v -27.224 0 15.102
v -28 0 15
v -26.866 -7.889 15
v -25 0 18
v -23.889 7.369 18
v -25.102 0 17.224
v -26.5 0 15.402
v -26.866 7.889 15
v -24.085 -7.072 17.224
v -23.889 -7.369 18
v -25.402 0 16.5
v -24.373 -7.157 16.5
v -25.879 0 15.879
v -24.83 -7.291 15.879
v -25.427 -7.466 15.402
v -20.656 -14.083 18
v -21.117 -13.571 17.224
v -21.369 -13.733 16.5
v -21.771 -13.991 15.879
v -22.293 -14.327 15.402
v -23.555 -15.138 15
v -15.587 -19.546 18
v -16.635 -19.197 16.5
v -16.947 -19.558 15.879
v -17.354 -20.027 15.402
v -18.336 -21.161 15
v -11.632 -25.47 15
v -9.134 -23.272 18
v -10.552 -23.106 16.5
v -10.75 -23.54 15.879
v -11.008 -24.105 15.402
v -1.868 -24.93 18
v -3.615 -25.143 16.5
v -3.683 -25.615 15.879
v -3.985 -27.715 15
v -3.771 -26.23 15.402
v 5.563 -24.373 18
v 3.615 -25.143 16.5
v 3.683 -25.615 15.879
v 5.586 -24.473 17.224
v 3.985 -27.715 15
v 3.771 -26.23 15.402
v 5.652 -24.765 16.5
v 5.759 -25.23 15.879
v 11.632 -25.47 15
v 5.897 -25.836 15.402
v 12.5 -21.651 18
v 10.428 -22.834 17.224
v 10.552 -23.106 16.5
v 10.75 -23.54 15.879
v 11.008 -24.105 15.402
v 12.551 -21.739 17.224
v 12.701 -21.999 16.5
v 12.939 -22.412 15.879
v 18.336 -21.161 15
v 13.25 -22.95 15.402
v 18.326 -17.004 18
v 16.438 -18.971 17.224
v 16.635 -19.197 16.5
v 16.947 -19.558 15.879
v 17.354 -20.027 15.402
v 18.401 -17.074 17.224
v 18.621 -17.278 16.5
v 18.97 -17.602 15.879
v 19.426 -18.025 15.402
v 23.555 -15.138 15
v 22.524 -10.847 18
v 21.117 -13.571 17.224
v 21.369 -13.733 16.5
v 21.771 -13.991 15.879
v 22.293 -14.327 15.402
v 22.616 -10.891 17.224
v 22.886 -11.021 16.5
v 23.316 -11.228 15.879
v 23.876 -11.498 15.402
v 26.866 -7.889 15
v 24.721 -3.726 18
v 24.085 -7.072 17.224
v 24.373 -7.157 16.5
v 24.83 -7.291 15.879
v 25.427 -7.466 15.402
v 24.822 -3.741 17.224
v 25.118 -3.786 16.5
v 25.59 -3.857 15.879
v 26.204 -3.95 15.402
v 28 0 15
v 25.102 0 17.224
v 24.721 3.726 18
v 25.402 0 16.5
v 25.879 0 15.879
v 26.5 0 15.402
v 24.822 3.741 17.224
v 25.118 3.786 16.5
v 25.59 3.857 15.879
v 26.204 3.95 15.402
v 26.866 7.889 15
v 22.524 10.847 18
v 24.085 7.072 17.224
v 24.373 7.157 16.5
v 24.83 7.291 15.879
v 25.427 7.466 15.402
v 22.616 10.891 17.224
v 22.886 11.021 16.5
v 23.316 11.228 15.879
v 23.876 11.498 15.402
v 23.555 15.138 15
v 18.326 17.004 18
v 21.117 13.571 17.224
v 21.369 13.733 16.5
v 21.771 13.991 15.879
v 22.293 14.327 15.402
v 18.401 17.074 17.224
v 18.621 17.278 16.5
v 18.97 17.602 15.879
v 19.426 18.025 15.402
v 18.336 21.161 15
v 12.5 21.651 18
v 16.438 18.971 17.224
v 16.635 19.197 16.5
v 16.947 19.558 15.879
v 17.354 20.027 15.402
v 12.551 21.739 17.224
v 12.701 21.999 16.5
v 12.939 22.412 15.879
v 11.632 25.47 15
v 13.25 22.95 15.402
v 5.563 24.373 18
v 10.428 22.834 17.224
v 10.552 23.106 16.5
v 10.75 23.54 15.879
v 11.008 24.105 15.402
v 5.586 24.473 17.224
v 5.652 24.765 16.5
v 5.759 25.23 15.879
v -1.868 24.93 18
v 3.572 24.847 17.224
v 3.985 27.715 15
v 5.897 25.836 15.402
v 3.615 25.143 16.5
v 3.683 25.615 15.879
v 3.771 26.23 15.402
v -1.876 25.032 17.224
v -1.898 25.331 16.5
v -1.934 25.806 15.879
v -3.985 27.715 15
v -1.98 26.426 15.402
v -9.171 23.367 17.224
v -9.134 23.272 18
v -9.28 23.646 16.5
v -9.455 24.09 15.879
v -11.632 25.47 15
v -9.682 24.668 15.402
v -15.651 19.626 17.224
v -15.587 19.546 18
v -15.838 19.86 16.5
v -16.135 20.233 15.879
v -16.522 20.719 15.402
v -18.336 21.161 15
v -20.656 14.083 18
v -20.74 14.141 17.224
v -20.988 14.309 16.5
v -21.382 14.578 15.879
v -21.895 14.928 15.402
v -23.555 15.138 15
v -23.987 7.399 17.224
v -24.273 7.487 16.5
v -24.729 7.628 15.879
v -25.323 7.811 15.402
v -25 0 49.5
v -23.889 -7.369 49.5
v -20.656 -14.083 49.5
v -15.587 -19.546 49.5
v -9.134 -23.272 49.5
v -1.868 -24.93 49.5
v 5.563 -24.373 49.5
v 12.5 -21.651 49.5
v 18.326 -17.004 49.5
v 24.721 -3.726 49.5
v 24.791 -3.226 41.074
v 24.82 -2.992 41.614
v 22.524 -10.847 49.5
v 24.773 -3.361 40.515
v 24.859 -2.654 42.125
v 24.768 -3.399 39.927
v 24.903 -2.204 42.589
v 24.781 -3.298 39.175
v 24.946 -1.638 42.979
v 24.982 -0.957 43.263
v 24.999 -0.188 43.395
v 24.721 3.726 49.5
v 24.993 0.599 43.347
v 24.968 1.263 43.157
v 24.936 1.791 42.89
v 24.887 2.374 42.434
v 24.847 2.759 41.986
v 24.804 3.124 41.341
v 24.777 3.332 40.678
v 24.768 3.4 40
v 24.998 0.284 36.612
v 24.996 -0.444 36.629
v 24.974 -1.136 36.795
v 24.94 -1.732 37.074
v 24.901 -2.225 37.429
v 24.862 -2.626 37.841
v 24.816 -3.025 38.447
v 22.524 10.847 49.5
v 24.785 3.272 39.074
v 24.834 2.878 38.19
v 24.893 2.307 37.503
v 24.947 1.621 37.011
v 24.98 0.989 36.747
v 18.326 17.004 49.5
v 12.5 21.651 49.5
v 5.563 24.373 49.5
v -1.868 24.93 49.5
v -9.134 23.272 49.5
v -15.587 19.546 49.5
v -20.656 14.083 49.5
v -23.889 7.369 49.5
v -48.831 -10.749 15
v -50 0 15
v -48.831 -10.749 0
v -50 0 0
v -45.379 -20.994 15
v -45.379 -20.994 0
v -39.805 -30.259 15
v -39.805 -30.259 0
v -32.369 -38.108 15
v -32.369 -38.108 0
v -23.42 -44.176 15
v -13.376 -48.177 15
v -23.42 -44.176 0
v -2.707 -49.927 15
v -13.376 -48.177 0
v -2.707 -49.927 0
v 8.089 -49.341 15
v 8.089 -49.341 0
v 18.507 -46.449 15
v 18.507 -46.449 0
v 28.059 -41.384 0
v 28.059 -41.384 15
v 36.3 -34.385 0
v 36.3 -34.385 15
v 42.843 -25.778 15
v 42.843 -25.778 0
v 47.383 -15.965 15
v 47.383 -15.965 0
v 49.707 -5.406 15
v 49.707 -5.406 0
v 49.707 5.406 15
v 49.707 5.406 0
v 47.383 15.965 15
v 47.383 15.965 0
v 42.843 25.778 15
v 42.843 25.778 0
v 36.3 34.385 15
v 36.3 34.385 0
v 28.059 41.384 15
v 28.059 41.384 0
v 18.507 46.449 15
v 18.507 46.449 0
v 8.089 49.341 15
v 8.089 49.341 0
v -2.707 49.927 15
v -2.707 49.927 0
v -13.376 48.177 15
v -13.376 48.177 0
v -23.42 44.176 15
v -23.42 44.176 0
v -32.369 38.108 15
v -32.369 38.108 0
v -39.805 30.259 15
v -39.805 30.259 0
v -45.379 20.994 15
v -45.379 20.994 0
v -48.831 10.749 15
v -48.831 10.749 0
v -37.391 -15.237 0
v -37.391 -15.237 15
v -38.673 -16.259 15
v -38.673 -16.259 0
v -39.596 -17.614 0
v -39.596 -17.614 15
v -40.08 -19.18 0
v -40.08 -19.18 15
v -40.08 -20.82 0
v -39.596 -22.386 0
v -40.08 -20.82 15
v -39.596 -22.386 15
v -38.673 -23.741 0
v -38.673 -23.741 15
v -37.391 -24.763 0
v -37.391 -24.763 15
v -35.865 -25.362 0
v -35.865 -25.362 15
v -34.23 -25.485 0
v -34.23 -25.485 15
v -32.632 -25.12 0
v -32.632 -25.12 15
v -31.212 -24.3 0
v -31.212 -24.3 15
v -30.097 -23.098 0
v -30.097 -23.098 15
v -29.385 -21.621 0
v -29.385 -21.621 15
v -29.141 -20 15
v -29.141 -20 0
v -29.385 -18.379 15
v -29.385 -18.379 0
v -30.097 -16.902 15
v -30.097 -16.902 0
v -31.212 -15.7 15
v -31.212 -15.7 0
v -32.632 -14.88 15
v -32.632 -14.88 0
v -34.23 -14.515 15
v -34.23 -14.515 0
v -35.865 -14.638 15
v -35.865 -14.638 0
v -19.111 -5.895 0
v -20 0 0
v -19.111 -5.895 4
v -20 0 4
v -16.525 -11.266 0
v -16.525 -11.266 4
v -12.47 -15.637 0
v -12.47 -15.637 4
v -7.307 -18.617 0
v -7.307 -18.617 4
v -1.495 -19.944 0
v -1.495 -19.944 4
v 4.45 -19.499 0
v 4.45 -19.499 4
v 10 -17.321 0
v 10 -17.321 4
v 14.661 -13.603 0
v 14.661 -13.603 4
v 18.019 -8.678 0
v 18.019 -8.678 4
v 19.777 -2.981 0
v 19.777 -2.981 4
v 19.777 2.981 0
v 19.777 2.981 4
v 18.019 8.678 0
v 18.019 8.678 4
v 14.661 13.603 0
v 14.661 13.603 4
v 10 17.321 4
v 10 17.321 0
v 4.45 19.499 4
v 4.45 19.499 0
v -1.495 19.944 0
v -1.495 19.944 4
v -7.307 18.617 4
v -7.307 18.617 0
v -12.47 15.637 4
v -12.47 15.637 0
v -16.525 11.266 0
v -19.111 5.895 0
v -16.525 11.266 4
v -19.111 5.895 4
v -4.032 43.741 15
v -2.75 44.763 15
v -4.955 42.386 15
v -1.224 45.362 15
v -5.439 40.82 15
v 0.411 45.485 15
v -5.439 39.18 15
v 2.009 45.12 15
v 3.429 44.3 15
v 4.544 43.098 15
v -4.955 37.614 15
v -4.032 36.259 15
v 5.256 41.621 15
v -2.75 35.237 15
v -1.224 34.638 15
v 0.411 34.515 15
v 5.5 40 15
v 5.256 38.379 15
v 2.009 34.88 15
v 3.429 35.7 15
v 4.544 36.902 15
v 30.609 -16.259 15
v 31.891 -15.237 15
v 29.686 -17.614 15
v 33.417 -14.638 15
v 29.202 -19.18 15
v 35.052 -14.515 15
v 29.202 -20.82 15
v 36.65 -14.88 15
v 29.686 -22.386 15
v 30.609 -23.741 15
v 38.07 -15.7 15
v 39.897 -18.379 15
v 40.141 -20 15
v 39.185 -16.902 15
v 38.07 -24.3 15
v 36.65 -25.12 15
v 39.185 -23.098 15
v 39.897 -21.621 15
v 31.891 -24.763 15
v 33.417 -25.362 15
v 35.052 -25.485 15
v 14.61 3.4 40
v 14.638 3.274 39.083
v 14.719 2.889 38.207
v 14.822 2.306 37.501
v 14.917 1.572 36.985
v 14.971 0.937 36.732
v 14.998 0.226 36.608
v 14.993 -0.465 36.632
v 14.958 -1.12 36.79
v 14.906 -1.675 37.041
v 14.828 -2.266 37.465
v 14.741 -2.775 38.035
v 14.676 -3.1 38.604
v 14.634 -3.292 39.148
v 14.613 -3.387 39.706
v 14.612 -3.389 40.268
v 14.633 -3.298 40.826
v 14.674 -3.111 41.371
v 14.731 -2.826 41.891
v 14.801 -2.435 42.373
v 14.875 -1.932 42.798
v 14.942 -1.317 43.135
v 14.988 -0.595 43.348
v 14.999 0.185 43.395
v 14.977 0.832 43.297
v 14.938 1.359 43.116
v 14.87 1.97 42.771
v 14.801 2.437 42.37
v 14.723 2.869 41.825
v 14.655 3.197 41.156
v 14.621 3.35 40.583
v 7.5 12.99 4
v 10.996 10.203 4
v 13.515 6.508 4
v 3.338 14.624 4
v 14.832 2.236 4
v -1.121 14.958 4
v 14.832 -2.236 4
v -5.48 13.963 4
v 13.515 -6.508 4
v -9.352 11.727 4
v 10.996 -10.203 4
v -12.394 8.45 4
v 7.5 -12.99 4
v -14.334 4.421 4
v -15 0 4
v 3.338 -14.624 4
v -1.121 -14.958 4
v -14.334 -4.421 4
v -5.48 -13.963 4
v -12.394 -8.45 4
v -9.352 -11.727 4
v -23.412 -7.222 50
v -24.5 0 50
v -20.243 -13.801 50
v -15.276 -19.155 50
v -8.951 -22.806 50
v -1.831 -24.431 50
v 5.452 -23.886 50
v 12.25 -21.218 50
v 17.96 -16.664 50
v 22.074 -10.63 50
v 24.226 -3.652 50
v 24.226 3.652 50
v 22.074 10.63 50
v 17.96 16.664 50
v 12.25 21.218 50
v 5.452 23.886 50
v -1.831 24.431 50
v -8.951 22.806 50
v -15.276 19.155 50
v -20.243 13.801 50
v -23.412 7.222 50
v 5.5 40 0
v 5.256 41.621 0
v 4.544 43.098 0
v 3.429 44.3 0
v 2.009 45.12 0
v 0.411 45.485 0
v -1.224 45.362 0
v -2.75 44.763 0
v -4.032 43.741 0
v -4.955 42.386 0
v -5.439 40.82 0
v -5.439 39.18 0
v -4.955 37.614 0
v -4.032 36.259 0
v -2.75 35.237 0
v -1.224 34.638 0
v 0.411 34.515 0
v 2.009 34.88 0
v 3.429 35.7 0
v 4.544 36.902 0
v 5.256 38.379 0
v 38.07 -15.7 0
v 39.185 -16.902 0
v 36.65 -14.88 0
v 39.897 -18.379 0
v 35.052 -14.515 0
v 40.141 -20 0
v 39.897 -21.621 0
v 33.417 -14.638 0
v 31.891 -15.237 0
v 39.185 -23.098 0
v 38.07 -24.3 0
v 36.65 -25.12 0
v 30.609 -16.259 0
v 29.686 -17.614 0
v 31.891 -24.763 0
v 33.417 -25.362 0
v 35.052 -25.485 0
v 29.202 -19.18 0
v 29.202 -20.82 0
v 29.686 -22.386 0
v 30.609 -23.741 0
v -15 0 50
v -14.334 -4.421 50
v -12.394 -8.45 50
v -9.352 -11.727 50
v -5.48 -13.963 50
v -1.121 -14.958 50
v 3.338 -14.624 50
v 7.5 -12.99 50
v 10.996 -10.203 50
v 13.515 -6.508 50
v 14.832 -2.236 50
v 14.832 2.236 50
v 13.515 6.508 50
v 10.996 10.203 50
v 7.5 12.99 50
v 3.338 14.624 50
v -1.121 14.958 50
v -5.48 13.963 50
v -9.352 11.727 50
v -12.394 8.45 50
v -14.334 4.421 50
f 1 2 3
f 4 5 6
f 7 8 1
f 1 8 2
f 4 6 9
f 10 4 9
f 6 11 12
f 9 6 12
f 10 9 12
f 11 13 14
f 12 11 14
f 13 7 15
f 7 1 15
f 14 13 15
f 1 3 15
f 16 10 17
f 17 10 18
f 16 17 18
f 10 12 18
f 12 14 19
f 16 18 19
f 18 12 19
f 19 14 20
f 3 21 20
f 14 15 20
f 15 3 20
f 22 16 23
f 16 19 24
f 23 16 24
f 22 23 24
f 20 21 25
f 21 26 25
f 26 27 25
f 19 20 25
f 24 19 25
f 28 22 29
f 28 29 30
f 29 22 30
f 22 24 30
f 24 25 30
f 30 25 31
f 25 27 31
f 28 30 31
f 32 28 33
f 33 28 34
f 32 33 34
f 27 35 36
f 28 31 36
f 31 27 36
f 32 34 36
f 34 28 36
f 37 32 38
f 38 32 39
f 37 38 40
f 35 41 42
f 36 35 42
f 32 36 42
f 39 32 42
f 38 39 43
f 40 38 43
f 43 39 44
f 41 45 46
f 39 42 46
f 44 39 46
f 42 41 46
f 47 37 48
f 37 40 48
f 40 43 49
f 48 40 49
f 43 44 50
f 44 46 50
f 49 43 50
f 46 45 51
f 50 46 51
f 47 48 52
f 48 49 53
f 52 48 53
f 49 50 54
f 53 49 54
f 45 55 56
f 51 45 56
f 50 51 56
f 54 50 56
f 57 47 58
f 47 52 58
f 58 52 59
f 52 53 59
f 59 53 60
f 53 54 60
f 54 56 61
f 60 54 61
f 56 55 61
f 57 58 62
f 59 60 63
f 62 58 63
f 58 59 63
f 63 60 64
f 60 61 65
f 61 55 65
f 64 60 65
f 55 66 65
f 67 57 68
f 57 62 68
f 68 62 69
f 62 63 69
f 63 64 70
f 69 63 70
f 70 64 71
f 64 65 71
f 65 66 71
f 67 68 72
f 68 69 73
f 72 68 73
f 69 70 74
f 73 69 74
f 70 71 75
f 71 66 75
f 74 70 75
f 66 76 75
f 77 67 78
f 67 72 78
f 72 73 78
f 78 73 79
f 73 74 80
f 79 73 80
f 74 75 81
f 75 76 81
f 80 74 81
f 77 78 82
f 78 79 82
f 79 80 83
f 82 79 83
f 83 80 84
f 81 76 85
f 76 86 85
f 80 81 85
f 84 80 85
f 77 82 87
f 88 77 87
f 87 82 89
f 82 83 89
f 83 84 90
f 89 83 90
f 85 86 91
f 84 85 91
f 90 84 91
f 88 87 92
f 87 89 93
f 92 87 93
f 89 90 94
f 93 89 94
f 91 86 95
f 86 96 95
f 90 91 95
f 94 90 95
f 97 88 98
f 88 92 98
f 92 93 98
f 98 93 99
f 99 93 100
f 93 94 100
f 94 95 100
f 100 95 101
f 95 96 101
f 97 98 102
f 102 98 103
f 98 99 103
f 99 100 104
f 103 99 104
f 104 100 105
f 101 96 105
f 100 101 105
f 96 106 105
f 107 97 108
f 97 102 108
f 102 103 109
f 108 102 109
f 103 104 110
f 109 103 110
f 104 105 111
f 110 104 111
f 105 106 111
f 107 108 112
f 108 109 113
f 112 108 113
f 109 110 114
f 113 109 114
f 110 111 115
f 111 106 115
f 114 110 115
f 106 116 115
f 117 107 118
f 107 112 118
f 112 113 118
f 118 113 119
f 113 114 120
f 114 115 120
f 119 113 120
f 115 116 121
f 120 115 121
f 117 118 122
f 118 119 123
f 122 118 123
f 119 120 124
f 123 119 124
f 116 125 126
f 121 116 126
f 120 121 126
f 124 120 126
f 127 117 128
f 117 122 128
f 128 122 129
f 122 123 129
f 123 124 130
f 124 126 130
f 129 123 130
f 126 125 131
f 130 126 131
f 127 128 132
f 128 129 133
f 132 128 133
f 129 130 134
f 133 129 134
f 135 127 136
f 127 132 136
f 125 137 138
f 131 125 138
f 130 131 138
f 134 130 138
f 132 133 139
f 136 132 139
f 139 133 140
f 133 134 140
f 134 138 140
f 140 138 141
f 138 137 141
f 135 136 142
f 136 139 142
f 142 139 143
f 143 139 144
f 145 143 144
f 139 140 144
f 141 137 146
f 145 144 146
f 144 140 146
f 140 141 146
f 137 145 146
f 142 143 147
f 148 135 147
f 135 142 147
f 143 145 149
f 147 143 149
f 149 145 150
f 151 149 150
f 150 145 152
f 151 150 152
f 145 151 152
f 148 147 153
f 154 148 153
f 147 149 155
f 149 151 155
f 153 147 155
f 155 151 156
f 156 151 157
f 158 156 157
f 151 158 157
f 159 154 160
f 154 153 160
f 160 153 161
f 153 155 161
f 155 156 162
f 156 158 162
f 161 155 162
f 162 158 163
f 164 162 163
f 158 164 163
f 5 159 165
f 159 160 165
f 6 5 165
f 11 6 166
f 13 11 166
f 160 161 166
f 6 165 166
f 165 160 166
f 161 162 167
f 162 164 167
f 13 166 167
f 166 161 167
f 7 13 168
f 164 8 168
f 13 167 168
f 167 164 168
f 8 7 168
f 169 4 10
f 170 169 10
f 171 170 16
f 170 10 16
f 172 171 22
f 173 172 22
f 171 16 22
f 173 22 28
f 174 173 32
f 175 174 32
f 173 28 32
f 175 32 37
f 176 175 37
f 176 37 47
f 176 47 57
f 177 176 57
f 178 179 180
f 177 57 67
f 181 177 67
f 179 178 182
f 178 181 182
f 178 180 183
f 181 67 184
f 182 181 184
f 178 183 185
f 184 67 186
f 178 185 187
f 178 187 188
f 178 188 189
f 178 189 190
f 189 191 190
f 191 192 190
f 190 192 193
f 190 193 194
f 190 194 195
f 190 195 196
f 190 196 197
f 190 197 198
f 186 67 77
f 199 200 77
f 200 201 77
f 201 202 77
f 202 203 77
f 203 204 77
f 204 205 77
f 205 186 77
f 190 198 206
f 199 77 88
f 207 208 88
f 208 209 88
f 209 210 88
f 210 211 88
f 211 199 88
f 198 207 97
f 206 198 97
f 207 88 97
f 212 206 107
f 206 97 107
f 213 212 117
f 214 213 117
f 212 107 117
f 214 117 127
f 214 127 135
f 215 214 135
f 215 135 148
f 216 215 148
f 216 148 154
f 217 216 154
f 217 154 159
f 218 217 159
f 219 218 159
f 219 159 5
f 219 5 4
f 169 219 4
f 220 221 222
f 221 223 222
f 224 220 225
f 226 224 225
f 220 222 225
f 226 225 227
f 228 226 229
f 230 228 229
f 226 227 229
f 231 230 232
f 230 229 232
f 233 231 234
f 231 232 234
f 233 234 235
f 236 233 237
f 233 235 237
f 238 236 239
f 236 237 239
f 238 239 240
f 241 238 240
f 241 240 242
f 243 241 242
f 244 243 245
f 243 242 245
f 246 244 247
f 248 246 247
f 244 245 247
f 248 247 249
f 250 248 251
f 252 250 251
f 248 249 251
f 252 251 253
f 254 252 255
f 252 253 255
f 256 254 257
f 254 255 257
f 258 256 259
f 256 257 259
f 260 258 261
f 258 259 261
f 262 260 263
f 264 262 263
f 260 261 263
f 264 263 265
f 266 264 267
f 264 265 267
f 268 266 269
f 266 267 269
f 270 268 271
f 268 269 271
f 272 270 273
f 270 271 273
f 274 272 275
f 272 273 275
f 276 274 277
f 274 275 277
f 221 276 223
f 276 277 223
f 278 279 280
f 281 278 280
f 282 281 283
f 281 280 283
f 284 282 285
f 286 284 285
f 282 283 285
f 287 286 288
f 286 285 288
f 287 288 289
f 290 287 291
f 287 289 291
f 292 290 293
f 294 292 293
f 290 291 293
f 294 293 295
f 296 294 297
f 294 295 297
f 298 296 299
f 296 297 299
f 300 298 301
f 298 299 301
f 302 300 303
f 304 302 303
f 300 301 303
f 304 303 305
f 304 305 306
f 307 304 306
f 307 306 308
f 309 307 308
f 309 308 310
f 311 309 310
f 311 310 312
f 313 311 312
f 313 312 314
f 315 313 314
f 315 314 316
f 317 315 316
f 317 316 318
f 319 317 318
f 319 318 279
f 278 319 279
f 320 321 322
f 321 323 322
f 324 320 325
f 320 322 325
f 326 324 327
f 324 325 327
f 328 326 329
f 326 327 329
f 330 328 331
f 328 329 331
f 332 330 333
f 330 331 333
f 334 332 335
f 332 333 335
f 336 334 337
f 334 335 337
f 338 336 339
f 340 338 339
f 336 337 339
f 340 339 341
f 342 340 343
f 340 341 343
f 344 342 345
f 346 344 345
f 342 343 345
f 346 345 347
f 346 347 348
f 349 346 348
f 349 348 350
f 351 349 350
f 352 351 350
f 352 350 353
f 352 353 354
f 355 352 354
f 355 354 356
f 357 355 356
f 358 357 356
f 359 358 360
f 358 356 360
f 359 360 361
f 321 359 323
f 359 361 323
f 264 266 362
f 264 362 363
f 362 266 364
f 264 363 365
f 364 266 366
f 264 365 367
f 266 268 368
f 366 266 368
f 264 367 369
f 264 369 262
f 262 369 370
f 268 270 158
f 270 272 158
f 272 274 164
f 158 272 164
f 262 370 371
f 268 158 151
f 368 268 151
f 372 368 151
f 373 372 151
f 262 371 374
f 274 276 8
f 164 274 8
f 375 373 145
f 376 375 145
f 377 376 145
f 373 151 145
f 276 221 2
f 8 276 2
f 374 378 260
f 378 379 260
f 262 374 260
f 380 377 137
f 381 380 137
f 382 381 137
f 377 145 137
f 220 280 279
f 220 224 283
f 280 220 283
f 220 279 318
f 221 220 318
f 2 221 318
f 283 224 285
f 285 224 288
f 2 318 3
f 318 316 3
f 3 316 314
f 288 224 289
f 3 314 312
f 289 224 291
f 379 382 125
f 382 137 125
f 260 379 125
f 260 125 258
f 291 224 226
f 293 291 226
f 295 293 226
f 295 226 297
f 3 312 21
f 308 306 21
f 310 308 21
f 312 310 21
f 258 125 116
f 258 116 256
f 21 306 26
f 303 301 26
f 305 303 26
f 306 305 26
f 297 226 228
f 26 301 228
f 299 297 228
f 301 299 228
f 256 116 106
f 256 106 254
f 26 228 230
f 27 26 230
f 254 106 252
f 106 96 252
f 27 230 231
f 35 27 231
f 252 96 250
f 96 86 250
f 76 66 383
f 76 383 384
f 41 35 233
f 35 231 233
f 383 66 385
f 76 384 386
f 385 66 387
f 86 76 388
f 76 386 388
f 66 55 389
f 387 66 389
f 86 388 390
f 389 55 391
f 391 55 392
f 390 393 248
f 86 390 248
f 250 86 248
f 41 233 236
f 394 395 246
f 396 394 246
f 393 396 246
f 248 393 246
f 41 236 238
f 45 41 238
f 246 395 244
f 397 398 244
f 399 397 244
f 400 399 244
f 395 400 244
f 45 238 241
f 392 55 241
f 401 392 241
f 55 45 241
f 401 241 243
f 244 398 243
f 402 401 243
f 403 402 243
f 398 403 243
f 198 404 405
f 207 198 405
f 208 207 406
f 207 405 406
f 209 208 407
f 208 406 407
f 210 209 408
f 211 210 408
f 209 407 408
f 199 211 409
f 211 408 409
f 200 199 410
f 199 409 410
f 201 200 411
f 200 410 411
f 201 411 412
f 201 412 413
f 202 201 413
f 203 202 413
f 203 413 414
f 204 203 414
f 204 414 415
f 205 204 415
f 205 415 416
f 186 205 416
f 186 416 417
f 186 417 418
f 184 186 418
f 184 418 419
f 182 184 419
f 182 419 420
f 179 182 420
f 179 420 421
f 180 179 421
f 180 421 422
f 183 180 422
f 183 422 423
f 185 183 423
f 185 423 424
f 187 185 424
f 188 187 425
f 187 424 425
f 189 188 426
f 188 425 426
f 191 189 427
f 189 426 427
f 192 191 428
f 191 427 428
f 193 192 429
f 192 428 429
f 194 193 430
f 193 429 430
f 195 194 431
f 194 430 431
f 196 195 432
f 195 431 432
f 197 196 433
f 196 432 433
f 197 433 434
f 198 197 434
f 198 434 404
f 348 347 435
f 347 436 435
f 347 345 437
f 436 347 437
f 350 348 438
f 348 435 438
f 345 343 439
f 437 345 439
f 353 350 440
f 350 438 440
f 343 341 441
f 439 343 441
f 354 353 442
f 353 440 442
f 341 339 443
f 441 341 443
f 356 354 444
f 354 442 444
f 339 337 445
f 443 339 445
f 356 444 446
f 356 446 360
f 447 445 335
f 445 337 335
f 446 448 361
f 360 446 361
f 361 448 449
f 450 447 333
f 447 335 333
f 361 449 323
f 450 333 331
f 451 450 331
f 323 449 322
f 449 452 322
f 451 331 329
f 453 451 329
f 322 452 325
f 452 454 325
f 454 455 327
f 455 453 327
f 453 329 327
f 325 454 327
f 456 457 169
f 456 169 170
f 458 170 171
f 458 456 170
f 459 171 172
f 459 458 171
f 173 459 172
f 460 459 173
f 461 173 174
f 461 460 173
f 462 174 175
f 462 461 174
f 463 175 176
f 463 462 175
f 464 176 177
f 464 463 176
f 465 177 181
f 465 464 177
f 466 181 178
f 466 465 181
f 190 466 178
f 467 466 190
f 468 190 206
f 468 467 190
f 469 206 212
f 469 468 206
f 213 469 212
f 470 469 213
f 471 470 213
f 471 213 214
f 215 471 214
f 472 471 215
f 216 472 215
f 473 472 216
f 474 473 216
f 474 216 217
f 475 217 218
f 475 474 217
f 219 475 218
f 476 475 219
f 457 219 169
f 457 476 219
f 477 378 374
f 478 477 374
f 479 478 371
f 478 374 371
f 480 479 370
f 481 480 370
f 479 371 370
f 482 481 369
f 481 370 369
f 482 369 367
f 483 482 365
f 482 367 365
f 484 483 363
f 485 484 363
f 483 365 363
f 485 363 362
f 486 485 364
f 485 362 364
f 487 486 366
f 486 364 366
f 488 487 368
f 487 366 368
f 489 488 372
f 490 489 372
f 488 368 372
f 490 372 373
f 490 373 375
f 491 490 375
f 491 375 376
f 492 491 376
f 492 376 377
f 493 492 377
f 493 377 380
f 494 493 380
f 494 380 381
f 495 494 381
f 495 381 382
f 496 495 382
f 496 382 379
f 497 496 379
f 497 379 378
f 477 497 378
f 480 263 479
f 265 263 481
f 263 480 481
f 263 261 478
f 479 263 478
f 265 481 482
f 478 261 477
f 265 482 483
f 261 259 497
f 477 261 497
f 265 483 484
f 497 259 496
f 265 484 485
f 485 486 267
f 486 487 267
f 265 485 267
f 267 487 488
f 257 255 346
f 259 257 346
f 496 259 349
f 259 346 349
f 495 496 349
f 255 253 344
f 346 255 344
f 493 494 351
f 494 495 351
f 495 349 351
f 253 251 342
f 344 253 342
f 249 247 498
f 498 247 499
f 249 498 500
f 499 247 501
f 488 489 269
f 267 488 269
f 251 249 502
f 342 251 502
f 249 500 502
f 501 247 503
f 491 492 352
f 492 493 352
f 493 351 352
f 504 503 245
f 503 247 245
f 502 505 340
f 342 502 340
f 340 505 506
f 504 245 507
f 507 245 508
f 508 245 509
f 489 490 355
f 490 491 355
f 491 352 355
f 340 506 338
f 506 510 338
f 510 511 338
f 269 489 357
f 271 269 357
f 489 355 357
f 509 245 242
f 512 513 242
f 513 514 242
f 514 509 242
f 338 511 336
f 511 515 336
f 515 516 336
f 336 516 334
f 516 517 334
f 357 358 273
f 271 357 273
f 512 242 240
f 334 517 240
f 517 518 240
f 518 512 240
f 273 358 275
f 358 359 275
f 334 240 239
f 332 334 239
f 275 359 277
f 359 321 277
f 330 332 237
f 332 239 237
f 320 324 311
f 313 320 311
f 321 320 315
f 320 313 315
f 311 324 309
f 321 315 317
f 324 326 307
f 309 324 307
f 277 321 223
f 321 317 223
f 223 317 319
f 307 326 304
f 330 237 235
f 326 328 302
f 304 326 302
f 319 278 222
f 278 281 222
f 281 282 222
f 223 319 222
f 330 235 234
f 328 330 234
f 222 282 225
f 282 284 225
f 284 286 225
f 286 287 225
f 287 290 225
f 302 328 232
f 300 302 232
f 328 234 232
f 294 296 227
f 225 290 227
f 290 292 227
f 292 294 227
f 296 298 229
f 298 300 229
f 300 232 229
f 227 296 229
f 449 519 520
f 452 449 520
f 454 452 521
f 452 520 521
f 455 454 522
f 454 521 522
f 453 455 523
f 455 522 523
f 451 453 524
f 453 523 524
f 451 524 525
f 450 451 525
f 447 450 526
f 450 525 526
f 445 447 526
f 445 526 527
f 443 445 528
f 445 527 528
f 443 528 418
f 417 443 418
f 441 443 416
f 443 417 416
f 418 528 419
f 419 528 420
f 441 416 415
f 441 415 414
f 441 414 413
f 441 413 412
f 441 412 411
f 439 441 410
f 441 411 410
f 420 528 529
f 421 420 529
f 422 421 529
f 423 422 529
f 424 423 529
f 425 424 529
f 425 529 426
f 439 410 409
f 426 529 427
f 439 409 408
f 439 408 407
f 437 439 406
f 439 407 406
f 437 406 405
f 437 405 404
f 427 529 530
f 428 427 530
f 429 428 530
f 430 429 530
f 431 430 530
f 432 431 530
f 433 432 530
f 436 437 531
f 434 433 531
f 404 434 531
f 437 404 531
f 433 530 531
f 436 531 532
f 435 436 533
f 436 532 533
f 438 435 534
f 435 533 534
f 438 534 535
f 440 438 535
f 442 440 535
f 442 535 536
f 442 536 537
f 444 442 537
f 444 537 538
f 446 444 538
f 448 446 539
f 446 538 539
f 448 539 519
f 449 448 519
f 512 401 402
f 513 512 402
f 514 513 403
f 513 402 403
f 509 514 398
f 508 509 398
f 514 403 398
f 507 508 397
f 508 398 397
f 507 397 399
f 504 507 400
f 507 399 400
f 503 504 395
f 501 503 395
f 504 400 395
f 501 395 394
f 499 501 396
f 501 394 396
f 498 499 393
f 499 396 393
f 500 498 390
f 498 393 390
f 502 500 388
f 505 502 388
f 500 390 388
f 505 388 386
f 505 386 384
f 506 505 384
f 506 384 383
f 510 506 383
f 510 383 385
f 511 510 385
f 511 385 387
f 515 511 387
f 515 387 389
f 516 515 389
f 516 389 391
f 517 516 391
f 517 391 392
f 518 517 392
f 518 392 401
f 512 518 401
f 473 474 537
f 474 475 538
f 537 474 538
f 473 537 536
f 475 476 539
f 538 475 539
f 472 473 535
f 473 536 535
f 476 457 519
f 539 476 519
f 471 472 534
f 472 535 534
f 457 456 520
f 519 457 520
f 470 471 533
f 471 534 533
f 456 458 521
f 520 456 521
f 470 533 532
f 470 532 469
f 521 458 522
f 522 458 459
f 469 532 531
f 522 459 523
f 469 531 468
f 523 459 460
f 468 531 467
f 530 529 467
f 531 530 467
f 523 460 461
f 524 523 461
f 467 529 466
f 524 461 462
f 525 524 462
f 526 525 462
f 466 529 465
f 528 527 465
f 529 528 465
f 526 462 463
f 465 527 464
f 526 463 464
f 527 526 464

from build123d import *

# Parameters (mm, degrees)
F2_R            = 3
F4_D            = 6.8
F4_DEPTH        = 50.001
F5_R            = 5.5
F6_DEPTH        = 15.001
F6_COPIES_COUNT = 3
F7_SIZE         = 0.5


# Not quite as in the source:
# - a pattern or mirror of a feature is missing from the dataset's text; its kind, count and spacing are read off the source's solid


with BuildPart() as f1:
    # F0 (on Front) → F1 (revolve)
    with BuildSketch(Plane.XZ):
        Polygon((-15, 4), (-15, 50), (-25, 50), (-25, 15), (-50, 15), (-50, 0), (-20, 0), (-20, 4), align=None)
    revolve(axis=Axis((0, 0, 33.7237479181), (0, 0, 1)))

    # F2
    f2_edges = [f1.edges().sort_by_distance(p)[0] for p in [
        (25, 0, 15),
    ]]
    fillet(f2_edges, radius=F2_R)

    # F4 (through all, one way)
    with BuildSketch(Plane(origin=(0, 0, 0), x_dir=(0, 1, 0), z_dir=(-1, 0, 0))):
        with Locations((0, -40)):
            Circle(F4_D / 2)
    extrude(amount=-F4_DEPTH, mode=Mode.SUBTRACT)

    # F5 (on face) → F6 (cut, through all)
    with BuildSketch(Plane.XY.offset(15)):
        with Locations((0, 40)):
            Circle(F5_R)
    f6 = extrude(amount=-F6_DEPTH, mode=Mode.SUBTRACT)

    # F6_copies: F6 ×3 about axis
    f6_copies_axis = Axis((0, 0, 0), (0, 0, 1))
    for i in range(1, F6_COPIES_COUNT):
        add(f6.rotate(f6_copies_axis, i * 360 / F6_COPIES_COUNT), mode=Mode.SUBTRACT)

    # F7
    f7_edges = [f1.edges().sort_by_distance(p)[0] for p in [
        (25, 0, 50),
    ]]
    chamfer(f7_edges, length=F7_SIZE)


solid = f1.part
